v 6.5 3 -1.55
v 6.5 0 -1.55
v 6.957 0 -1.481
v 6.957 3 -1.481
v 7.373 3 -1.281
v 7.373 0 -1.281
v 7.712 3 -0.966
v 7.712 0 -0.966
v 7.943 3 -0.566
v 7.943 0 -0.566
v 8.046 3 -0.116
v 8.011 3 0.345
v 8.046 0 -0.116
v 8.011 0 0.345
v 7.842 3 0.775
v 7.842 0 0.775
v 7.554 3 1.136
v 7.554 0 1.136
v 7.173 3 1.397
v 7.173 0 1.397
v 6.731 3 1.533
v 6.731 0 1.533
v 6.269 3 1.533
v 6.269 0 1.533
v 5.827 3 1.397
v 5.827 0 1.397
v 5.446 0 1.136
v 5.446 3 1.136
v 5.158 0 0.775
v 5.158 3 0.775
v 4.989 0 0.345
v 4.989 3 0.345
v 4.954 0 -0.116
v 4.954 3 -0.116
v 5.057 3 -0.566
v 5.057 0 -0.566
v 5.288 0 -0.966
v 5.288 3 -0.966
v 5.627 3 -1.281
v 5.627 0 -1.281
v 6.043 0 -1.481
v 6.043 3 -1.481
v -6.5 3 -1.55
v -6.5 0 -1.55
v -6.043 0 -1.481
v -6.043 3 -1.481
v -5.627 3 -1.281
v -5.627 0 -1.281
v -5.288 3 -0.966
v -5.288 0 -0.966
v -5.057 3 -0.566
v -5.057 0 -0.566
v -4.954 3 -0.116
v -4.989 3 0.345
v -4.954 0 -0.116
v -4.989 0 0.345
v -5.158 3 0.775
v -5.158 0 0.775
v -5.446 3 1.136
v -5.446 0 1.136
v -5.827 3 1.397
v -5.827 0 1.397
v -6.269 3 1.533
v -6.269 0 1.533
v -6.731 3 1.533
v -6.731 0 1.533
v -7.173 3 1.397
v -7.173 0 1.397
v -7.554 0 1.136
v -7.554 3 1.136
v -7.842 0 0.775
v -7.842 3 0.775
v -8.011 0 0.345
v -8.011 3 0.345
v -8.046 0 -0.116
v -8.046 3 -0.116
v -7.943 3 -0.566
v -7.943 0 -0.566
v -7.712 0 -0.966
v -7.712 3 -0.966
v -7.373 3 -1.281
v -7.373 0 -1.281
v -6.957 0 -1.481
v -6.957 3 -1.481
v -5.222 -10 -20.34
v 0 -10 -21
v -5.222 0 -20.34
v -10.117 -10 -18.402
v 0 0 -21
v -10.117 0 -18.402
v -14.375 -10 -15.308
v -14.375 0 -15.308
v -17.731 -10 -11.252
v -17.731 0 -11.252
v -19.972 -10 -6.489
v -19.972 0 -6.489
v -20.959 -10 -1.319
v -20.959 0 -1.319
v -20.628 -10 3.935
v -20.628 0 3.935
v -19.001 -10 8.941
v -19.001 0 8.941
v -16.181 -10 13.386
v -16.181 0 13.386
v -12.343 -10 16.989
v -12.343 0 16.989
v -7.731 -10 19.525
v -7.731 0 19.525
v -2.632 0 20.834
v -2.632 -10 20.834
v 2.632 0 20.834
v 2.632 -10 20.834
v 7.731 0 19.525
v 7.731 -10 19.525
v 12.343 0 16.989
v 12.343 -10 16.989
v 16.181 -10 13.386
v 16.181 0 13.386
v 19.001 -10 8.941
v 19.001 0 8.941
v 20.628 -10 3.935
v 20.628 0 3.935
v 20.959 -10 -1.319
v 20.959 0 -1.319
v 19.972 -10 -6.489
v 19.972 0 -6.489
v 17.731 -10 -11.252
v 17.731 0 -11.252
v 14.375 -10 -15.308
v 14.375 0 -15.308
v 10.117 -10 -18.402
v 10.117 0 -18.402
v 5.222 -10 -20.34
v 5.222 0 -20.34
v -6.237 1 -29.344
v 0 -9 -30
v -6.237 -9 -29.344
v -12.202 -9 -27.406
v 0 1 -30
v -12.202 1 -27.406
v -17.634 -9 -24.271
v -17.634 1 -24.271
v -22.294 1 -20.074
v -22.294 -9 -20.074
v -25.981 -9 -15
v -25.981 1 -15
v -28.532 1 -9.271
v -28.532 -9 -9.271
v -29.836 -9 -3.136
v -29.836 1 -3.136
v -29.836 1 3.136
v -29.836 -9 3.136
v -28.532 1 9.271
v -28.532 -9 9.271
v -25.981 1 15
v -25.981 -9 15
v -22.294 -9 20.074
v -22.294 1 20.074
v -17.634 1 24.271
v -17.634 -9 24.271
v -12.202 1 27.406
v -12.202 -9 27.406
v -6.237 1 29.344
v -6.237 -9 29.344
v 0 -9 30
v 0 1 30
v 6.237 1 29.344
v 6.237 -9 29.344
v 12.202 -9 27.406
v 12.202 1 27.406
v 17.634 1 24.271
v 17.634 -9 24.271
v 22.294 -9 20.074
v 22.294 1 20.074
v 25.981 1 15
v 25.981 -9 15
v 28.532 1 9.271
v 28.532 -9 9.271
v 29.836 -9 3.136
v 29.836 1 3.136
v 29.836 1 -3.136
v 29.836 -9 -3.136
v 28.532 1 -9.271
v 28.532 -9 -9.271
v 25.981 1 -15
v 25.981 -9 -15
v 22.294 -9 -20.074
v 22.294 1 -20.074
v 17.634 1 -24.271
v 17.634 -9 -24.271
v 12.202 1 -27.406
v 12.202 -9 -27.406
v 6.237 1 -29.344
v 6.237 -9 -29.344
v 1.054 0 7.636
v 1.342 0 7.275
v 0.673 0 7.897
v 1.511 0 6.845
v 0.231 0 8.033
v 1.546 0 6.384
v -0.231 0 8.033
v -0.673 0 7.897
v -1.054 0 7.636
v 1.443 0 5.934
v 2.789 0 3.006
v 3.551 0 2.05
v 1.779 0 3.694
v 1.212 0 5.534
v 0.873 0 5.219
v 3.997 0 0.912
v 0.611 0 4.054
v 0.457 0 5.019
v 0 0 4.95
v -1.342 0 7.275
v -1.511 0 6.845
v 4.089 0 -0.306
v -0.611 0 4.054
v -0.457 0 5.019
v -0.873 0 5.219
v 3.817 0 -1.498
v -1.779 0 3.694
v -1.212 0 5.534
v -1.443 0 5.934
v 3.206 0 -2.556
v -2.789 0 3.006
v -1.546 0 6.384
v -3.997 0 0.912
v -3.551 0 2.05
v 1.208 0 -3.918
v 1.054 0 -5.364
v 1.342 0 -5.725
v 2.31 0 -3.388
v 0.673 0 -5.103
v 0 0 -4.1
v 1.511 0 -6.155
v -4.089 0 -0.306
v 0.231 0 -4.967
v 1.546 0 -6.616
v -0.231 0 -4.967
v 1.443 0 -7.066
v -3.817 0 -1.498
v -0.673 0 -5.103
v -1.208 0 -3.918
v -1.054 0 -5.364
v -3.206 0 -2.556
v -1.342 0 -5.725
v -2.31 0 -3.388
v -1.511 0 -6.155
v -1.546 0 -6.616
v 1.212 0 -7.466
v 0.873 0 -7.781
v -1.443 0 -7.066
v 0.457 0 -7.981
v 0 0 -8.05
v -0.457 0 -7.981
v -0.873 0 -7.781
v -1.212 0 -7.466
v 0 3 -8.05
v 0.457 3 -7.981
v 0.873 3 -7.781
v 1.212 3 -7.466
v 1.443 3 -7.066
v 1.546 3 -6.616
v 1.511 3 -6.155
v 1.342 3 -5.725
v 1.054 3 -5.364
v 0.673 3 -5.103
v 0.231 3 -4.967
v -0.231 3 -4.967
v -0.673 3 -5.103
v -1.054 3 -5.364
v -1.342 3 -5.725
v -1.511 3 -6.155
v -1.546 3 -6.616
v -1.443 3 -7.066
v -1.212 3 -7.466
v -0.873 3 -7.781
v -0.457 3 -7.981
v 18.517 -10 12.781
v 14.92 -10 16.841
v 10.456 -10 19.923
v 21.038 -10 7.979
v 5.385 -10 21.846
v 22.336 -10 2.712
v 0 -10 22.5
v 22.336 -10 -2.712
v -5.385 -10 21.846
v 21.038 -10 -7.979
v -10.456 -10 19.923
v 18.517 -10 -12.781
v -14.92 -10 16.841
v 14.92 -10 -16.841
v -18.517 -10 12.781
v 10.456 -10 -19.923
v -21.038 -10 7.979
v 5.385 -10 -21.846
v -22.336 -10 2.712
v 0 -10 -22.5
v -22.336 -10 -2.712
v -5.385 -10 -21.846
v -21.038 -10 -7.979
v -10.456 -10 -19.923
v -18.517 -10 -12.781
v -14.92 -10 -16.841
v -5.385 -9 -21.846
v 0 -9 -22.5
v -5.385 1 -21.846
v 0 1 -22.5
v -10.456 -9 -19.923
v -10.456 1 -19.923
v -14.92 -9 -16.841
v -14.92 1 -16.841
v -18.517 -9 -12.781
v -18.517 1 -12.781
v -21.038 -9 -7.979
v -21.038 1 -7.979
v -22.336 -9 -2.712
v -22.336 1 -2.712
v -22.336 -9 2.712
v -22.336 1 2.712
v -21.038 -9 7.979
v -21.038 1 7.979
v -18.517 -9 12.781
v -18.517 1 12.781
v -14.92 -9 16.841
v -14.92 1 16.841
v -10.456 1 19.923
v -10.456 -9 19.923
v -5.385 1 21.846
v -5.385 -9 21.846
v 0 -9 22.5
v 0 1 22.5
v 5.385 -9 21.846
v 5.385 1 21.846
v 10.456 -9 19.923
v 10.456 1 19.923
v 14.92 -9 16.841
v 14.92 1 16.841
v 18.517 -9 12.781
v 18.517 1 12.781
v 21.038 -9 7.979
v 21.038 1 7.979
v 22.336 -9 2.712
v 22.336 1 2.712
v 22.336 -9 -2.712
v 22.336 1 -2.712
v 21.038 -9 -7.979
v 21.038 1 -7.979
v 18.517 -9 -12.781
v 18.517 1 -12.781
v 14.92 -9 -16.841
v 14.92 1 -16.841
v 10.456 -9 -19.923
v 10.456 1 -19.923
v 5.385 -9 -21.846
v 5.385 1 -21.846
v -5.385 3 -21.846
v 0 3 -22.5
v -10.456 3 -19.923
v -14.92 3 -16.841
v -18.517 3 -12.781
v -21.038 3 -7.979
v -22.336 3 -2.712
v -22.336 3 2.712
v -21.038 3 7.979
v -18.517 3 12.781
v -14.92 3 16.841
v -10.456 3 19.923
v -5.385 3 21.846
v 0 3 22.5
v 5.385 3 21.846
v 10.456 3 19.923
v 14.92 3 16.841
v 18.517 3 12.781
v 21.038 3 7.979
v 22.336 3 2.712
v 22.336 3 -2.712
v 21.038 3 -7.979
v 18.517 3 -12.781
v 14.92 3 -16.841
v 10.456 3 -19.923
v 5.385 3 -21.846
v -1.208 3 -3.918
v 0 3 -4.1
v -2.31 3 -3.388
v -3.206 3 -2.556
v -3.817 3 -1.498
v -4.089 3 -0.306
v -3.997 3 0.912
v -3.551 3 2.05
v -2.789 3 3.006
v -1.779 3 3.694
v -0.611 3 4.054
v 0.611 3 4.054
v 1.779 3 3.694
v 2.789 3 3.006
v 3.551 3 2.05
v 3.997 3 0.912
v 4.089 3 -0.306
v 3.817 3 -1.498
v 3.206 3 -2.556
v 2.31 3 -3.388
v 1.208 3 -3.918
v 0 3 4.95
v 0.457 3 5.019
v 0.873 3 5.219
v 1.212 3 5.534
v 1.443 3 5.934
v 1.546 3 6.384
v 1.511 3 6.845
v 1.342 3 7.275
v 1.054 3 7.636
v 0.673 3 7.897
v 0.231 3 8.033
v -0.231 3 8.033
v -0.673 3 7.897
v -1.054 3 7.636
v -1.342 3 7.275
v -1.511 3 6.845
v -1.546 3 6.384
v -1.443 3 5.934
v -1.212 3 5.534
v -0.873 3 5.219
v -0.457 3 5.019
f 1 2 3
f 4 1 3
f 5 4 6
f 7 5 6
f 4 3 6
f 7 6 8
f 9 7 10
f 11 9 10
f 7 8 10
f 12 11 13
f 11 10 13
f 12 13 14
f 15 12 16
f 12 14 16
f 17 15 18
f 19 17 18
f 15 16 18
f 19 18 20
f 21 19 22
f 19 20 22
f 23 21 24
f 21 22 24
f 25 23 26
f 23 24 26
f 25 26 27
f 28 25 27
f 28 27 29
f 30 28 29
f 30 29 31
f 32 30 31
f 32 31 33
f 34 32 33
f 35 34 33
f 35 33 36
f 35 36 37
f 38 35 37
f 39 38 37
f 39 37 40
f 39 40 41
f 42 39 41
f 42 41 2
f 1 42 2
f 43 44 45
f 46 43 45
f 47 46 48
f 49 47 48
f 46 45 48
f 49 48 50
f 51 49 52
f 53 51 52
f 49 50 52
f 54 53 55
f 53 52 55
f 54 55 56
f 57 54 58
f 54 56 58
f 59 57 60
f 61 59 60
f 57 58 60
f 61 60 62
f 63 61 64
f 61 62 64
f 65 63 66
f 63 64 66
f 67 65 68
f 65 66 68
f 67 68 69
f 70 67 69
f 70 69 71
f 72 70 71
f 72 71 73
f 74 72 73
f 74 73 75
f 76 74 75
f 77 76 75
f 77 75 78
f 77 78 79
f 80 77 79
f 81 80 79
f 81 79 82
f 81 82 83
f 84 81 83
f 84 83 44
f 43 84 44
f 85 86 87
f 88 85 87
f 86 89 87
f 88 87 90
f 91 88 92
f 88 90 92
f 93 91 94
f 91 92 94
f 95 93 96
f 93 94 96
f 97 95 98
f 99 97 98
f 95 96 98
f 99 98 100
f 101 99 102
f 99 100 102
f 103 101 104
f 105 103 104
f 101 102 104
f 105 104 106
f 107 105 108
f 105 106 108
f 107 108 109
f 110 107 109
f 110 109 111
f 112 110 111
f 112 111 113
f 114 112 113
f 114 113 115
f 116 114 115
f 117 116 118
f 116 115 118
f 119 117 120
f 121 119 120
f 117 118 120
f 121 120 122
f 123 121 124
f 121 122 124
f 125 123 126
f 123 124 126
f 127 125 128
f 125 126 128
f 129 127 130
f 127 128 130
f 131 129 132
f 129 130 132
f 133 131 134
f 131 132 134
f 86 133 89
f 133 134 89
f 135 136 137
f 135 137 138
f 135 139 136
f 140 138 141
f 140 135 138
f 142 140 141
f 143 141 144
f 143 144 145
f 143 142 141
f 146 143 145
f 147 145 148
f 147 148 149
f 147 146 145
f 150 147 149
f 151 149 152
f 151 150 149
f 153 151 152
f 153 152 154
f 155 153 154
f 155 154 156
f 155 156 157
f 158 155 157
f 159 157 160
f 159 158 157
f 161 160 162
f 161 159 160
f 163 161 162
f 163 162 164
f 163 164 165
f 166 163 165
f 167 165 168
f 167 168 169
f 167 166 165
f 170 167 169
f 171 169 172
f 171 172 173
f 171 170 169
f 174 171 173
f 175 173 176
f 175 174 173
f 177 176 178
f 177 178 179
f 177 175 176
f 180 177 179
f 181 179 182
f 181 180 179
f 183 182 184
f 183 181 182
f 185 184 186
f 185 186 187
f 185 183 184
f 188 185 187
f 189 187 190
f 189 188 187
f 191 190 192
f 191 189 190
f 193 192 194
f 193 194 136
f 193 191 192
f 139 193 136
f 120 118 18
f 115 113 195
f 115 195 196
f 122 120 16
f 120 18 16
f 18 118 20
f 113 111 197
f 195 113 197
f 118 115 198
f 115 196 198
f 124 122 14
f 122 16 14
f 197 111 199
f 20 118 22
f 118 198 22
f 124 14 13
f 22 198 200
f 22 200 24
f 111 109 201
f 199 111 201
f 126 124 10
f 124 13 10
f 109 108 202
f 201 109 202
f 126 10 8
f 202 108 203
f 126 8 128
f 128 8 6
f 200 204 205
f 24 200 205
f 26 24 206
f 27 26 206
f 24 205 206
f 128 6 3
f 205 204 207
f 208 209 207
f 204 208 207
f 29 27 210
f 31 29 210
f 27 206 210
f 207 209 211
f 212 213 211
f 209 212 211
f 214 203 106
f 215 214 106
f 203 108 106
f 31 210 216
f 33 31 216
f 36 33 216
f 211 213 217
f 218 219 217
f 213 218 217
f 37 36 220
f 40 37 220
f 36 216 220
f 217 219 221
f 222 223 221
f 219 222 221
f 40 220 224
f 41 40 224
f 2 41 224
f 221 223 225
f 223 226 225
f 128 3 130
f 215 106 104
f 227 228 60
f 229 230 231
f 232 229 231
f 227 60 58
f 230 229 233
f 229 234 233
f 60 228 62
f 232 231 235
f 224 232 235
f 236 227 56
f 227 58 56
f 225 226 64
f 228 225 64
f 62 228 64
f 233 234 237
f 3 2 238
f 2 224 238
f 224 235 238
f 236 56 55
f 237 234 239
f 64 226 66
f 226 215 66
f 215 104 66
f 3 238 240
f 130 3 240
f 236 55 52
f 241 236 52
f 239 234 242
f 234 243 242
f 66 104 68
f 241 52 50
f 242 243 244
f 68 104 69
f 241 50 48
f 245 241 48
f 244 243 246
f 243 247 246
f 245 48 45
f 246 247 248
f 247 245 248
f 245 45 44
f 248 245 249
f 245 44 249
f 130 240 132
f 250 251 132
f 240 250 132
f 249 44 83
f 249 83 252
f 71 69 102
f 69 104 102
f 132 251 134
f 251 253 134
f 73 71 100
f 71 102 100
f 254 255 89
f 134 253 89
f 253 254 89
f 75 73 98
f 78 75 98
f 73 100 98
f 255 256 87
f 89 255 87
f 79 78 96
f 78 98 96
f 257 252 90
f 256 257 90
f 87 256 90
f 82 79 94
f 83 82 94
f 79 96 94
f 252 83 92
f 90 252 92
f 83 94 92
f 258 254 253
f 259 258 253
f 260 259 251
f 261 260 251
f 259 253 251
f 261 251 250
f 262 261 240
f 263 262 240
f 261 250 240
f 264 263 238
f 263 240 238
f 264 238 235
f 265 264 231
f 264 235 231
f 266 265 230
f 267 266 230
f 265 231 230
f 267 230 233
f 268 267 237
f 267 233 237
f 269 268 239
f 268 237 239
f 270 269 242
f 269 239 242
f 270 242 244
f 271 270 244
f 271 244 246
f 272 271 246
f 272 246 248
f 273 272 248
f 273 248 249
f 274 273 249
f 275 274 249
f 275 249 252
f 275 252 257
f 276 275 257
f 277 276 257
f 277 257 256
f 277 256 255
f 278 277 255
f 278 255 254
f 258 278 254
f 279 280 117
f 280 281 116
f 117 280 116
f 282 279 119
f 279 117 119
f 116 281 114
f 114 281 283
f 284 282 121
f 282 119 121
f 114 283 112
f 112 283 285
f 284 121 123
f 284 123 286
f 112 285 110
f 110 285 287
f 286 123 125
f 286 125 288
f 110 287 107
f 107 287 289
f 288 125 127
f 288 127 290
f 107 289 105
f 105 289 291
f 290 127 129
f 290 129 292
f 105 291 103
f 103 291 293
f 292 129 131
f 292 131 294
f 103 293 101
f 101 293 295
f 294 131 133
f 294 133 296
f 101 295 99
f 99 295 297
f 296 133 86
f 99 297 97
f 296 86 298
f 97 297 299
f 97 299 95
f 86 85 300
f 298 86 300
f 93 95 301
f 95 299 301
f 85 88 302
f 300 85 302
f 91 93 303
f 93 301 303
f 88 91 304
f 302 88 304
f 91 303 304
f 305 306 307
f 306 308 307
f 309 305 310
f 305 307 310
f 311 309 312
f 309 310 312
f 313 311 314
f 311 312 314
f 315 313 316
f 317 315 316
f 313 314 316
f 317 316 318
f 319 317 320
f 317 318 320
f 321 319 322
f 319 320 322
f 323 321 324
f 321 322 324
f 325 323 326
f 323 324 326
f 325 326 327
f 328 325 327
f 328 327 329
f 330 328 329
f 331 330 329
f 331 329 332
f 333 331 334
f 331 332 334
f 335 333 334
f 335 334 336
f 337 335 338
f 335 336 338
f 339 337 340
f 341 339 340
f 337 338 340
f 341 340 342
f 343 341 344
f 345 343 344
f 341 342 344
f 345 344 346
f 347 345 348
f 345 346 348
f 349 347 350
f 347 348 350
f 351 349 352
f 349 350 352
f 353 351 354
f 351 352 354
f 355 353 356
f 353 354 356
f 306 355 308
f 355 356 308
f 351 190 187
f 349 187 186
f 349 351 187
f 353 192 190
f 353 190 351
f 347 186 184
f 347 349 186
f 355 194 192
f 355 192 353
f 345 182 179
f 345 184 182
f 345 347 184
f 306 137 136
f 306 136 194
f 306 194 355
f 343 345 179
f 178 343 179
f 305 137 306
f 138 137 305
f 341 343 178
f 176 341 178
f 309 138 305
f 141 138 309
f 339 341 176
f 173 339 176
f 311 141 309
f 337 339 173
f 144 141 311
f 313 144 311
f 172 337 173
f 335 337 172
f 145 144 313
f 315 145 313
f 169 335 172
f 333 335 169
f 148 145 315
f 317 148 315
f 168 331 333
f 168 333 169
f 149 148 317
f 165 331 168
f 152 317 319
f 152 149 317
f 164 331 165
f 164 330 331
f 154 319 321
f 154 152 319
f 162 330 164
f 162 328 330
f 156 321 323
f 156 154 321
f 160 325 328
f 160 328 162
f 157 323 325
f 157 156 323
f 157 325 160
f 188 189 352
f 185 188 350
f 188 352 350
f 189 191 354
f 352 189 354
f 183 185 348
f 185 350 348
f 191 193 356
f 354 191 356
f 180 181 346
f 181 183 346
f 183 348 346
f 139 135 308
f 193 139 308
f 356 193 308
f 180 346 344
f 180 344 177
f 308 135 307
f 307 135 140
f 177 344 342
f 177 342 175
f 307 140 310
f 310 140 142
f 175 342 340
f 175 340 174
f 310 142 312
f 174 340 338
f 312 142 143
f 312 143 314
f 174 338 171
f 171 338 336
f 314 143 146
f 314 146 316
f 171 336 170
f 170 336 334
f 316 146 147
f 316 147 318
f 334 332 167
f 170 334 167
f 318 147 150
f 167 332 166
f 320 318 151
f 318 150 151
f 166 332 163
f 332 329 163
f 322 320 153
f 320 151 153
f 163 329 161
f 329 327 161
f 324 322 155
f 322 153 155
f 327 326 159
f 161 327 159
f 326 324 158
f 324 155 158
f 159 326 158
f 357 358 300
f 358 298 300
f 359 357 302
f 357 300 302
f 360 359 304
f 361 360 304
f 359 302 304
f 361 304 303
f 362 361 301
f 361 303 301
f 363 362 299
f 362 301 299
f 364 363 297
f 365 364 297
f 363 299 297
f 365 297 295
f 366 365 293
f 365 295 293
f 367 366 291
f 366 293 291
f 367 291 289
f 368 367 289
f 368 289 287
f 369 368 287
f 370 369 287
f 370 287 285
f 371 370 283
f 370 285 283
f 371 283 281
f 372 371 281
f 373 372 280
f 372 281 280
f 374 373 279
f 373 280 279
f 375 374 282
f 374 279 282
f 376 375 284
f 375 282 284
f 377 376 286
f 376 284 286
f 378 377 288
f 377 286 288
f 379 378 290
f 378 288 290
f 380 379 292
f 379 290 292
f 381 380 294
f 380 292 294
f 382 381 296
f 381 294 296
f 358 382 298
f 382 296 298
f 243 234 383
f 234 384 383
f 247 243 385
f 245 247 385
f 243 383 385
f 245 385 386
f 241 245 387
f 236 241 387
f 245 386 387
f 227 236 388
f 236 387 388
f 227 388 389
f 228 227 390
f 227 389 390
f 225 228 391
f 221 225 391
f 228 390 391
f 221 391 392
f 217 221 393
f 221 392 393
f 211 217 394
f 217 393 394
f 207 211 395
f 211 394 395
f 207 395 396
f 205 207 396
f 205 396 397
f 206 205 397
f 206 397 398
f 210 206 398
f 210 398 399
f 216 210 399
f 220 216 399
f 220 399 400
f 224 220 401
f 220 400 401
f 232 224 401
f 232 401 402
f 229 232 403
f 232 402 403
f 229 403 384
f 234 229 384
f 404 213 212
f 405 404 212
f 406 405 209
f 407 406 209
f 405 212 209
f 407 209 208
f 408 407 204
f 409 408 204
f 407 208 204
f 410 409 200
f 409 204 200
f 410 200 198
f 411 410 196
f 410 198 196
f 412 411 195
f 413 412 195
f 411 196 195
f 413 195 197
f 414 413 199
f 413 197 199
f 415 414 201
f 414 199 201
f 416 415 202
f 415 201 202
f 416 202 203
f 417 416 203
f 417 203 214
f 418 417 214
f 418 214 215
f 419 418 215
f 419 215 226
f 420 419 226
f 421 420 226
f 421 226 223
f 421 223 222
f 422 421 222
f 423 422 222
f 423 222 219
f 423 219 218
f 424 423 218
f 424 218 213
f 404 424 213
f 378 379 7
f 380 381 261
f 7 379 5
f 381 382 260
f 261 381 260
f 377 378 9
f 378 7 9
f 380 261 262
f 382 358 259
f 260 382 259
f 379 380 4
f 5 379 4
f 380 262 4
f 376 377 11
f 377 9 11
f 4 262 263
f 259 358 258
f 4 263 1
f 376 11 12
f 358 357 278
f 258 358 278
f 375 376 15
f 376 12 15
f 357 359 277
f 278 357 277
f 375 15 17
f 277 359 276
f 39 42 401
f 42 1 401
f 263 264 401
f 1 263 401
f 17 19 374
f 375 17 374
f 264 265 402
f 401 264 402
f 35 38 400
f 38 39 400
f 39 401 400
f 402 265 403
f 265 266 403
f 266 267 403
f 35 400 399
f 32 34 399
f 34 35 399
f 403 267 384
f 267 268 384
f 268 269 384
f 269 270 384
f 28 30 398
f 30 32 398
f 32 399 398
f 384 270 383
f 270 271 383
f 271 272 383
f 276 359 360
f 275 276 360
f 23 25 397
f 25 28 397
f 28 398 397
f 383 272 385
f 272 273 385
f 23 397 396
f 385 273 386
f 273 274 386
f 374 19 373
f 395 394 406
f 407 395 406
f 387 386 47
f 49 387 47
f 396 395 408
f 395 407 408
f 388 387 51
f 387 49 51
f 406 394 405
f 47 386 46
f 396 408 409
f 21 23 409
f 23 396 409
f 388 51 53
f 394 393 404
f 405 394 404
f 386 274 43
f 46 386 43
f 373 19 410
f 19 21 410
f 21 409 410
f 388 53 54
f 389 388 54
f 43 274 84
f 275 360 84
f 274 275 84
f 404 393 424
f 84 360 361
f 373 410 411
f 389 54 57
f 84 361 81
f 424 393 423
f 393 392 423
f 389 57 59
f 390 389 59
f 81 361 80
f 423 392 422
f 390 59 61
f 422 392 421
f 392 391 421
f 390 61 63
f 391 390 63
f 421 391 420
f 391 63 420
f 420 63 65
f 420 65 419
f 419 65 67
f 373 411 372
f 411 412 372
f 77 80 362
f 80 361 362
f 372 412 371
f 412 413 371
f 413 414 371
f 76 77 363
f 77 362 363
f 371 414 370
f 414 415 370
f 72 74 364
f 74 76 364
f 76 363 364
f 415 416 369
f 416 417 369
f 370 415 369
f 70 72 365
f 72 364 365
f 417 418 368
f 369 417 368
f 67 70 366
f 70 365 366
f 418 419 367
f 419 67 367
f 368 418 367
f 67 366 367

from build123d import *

# Parameters (mm, degrees)
SKETCH_2_W          = 7.5
SKETCH_2_H          = 10
SKETCH_3_R          = 1.55
CUT_EXTRUDE_1_DEPTH = 10


with BuildPart() as part:
    # 草图1 → 旋转1 (revolve)
    with BuildSketch(Plane.XY, mode=Mode.PRIVATE) as revolve_1_sk:
        Polygon((4.1, 0), (4.1, 3), (22.5, 3), (22.5, -10), (21, -10), (21, 0), align=None)
    revolve(revolve_1_sk.sketch.rotate(Axis((0, 0, 0), (0, 1, 0)), 90), axis=Axis((0, 0, 0), (0, 1, 0)))

    # 草图3 → 切除-拉伸1 (cut)
    with BuildSketch(Plane.XZ):
        with Locations(Location((6.5, 0, 0), (0, 0, 270))):
            Circle(SKETCH_3_R)
        with Locations(Location((-6.5, 0, 0), (0, 0, 270))):
            Circle(SKETCH_3_R)
        with Locations(Location((0, 6.5, 0), (0, 0, 270))):
            Circle(SKETCH_3_R)
        with Locations(Location((0, -6.5, 0), (0, 0, 270))):
            Circle(SKETCH_3_R)
    extrude(amount=-CUT_EXTRUDE_1_DEPTH, mode=Mode.SUBTRACT)


with BuildPart() as body_2:
    # 草图2 → 旋转2 (revolve)
    with BuildSketch(Plane.XY, mode=Mode.PRIVATE) as revolve_2_sk:
        with Locations((26.25, -4)):
            Rectangle(SKETCH_2_W, SKETCH_2_H)
    revolve(revolve_2_sk.sketch.rotate(Axis((0, 0, 0), (0, 1, 0)), 90), axis=Axis((0, 0, 0), (0, 1, 0)))


solid = Compound([part.part, body_2.part])
